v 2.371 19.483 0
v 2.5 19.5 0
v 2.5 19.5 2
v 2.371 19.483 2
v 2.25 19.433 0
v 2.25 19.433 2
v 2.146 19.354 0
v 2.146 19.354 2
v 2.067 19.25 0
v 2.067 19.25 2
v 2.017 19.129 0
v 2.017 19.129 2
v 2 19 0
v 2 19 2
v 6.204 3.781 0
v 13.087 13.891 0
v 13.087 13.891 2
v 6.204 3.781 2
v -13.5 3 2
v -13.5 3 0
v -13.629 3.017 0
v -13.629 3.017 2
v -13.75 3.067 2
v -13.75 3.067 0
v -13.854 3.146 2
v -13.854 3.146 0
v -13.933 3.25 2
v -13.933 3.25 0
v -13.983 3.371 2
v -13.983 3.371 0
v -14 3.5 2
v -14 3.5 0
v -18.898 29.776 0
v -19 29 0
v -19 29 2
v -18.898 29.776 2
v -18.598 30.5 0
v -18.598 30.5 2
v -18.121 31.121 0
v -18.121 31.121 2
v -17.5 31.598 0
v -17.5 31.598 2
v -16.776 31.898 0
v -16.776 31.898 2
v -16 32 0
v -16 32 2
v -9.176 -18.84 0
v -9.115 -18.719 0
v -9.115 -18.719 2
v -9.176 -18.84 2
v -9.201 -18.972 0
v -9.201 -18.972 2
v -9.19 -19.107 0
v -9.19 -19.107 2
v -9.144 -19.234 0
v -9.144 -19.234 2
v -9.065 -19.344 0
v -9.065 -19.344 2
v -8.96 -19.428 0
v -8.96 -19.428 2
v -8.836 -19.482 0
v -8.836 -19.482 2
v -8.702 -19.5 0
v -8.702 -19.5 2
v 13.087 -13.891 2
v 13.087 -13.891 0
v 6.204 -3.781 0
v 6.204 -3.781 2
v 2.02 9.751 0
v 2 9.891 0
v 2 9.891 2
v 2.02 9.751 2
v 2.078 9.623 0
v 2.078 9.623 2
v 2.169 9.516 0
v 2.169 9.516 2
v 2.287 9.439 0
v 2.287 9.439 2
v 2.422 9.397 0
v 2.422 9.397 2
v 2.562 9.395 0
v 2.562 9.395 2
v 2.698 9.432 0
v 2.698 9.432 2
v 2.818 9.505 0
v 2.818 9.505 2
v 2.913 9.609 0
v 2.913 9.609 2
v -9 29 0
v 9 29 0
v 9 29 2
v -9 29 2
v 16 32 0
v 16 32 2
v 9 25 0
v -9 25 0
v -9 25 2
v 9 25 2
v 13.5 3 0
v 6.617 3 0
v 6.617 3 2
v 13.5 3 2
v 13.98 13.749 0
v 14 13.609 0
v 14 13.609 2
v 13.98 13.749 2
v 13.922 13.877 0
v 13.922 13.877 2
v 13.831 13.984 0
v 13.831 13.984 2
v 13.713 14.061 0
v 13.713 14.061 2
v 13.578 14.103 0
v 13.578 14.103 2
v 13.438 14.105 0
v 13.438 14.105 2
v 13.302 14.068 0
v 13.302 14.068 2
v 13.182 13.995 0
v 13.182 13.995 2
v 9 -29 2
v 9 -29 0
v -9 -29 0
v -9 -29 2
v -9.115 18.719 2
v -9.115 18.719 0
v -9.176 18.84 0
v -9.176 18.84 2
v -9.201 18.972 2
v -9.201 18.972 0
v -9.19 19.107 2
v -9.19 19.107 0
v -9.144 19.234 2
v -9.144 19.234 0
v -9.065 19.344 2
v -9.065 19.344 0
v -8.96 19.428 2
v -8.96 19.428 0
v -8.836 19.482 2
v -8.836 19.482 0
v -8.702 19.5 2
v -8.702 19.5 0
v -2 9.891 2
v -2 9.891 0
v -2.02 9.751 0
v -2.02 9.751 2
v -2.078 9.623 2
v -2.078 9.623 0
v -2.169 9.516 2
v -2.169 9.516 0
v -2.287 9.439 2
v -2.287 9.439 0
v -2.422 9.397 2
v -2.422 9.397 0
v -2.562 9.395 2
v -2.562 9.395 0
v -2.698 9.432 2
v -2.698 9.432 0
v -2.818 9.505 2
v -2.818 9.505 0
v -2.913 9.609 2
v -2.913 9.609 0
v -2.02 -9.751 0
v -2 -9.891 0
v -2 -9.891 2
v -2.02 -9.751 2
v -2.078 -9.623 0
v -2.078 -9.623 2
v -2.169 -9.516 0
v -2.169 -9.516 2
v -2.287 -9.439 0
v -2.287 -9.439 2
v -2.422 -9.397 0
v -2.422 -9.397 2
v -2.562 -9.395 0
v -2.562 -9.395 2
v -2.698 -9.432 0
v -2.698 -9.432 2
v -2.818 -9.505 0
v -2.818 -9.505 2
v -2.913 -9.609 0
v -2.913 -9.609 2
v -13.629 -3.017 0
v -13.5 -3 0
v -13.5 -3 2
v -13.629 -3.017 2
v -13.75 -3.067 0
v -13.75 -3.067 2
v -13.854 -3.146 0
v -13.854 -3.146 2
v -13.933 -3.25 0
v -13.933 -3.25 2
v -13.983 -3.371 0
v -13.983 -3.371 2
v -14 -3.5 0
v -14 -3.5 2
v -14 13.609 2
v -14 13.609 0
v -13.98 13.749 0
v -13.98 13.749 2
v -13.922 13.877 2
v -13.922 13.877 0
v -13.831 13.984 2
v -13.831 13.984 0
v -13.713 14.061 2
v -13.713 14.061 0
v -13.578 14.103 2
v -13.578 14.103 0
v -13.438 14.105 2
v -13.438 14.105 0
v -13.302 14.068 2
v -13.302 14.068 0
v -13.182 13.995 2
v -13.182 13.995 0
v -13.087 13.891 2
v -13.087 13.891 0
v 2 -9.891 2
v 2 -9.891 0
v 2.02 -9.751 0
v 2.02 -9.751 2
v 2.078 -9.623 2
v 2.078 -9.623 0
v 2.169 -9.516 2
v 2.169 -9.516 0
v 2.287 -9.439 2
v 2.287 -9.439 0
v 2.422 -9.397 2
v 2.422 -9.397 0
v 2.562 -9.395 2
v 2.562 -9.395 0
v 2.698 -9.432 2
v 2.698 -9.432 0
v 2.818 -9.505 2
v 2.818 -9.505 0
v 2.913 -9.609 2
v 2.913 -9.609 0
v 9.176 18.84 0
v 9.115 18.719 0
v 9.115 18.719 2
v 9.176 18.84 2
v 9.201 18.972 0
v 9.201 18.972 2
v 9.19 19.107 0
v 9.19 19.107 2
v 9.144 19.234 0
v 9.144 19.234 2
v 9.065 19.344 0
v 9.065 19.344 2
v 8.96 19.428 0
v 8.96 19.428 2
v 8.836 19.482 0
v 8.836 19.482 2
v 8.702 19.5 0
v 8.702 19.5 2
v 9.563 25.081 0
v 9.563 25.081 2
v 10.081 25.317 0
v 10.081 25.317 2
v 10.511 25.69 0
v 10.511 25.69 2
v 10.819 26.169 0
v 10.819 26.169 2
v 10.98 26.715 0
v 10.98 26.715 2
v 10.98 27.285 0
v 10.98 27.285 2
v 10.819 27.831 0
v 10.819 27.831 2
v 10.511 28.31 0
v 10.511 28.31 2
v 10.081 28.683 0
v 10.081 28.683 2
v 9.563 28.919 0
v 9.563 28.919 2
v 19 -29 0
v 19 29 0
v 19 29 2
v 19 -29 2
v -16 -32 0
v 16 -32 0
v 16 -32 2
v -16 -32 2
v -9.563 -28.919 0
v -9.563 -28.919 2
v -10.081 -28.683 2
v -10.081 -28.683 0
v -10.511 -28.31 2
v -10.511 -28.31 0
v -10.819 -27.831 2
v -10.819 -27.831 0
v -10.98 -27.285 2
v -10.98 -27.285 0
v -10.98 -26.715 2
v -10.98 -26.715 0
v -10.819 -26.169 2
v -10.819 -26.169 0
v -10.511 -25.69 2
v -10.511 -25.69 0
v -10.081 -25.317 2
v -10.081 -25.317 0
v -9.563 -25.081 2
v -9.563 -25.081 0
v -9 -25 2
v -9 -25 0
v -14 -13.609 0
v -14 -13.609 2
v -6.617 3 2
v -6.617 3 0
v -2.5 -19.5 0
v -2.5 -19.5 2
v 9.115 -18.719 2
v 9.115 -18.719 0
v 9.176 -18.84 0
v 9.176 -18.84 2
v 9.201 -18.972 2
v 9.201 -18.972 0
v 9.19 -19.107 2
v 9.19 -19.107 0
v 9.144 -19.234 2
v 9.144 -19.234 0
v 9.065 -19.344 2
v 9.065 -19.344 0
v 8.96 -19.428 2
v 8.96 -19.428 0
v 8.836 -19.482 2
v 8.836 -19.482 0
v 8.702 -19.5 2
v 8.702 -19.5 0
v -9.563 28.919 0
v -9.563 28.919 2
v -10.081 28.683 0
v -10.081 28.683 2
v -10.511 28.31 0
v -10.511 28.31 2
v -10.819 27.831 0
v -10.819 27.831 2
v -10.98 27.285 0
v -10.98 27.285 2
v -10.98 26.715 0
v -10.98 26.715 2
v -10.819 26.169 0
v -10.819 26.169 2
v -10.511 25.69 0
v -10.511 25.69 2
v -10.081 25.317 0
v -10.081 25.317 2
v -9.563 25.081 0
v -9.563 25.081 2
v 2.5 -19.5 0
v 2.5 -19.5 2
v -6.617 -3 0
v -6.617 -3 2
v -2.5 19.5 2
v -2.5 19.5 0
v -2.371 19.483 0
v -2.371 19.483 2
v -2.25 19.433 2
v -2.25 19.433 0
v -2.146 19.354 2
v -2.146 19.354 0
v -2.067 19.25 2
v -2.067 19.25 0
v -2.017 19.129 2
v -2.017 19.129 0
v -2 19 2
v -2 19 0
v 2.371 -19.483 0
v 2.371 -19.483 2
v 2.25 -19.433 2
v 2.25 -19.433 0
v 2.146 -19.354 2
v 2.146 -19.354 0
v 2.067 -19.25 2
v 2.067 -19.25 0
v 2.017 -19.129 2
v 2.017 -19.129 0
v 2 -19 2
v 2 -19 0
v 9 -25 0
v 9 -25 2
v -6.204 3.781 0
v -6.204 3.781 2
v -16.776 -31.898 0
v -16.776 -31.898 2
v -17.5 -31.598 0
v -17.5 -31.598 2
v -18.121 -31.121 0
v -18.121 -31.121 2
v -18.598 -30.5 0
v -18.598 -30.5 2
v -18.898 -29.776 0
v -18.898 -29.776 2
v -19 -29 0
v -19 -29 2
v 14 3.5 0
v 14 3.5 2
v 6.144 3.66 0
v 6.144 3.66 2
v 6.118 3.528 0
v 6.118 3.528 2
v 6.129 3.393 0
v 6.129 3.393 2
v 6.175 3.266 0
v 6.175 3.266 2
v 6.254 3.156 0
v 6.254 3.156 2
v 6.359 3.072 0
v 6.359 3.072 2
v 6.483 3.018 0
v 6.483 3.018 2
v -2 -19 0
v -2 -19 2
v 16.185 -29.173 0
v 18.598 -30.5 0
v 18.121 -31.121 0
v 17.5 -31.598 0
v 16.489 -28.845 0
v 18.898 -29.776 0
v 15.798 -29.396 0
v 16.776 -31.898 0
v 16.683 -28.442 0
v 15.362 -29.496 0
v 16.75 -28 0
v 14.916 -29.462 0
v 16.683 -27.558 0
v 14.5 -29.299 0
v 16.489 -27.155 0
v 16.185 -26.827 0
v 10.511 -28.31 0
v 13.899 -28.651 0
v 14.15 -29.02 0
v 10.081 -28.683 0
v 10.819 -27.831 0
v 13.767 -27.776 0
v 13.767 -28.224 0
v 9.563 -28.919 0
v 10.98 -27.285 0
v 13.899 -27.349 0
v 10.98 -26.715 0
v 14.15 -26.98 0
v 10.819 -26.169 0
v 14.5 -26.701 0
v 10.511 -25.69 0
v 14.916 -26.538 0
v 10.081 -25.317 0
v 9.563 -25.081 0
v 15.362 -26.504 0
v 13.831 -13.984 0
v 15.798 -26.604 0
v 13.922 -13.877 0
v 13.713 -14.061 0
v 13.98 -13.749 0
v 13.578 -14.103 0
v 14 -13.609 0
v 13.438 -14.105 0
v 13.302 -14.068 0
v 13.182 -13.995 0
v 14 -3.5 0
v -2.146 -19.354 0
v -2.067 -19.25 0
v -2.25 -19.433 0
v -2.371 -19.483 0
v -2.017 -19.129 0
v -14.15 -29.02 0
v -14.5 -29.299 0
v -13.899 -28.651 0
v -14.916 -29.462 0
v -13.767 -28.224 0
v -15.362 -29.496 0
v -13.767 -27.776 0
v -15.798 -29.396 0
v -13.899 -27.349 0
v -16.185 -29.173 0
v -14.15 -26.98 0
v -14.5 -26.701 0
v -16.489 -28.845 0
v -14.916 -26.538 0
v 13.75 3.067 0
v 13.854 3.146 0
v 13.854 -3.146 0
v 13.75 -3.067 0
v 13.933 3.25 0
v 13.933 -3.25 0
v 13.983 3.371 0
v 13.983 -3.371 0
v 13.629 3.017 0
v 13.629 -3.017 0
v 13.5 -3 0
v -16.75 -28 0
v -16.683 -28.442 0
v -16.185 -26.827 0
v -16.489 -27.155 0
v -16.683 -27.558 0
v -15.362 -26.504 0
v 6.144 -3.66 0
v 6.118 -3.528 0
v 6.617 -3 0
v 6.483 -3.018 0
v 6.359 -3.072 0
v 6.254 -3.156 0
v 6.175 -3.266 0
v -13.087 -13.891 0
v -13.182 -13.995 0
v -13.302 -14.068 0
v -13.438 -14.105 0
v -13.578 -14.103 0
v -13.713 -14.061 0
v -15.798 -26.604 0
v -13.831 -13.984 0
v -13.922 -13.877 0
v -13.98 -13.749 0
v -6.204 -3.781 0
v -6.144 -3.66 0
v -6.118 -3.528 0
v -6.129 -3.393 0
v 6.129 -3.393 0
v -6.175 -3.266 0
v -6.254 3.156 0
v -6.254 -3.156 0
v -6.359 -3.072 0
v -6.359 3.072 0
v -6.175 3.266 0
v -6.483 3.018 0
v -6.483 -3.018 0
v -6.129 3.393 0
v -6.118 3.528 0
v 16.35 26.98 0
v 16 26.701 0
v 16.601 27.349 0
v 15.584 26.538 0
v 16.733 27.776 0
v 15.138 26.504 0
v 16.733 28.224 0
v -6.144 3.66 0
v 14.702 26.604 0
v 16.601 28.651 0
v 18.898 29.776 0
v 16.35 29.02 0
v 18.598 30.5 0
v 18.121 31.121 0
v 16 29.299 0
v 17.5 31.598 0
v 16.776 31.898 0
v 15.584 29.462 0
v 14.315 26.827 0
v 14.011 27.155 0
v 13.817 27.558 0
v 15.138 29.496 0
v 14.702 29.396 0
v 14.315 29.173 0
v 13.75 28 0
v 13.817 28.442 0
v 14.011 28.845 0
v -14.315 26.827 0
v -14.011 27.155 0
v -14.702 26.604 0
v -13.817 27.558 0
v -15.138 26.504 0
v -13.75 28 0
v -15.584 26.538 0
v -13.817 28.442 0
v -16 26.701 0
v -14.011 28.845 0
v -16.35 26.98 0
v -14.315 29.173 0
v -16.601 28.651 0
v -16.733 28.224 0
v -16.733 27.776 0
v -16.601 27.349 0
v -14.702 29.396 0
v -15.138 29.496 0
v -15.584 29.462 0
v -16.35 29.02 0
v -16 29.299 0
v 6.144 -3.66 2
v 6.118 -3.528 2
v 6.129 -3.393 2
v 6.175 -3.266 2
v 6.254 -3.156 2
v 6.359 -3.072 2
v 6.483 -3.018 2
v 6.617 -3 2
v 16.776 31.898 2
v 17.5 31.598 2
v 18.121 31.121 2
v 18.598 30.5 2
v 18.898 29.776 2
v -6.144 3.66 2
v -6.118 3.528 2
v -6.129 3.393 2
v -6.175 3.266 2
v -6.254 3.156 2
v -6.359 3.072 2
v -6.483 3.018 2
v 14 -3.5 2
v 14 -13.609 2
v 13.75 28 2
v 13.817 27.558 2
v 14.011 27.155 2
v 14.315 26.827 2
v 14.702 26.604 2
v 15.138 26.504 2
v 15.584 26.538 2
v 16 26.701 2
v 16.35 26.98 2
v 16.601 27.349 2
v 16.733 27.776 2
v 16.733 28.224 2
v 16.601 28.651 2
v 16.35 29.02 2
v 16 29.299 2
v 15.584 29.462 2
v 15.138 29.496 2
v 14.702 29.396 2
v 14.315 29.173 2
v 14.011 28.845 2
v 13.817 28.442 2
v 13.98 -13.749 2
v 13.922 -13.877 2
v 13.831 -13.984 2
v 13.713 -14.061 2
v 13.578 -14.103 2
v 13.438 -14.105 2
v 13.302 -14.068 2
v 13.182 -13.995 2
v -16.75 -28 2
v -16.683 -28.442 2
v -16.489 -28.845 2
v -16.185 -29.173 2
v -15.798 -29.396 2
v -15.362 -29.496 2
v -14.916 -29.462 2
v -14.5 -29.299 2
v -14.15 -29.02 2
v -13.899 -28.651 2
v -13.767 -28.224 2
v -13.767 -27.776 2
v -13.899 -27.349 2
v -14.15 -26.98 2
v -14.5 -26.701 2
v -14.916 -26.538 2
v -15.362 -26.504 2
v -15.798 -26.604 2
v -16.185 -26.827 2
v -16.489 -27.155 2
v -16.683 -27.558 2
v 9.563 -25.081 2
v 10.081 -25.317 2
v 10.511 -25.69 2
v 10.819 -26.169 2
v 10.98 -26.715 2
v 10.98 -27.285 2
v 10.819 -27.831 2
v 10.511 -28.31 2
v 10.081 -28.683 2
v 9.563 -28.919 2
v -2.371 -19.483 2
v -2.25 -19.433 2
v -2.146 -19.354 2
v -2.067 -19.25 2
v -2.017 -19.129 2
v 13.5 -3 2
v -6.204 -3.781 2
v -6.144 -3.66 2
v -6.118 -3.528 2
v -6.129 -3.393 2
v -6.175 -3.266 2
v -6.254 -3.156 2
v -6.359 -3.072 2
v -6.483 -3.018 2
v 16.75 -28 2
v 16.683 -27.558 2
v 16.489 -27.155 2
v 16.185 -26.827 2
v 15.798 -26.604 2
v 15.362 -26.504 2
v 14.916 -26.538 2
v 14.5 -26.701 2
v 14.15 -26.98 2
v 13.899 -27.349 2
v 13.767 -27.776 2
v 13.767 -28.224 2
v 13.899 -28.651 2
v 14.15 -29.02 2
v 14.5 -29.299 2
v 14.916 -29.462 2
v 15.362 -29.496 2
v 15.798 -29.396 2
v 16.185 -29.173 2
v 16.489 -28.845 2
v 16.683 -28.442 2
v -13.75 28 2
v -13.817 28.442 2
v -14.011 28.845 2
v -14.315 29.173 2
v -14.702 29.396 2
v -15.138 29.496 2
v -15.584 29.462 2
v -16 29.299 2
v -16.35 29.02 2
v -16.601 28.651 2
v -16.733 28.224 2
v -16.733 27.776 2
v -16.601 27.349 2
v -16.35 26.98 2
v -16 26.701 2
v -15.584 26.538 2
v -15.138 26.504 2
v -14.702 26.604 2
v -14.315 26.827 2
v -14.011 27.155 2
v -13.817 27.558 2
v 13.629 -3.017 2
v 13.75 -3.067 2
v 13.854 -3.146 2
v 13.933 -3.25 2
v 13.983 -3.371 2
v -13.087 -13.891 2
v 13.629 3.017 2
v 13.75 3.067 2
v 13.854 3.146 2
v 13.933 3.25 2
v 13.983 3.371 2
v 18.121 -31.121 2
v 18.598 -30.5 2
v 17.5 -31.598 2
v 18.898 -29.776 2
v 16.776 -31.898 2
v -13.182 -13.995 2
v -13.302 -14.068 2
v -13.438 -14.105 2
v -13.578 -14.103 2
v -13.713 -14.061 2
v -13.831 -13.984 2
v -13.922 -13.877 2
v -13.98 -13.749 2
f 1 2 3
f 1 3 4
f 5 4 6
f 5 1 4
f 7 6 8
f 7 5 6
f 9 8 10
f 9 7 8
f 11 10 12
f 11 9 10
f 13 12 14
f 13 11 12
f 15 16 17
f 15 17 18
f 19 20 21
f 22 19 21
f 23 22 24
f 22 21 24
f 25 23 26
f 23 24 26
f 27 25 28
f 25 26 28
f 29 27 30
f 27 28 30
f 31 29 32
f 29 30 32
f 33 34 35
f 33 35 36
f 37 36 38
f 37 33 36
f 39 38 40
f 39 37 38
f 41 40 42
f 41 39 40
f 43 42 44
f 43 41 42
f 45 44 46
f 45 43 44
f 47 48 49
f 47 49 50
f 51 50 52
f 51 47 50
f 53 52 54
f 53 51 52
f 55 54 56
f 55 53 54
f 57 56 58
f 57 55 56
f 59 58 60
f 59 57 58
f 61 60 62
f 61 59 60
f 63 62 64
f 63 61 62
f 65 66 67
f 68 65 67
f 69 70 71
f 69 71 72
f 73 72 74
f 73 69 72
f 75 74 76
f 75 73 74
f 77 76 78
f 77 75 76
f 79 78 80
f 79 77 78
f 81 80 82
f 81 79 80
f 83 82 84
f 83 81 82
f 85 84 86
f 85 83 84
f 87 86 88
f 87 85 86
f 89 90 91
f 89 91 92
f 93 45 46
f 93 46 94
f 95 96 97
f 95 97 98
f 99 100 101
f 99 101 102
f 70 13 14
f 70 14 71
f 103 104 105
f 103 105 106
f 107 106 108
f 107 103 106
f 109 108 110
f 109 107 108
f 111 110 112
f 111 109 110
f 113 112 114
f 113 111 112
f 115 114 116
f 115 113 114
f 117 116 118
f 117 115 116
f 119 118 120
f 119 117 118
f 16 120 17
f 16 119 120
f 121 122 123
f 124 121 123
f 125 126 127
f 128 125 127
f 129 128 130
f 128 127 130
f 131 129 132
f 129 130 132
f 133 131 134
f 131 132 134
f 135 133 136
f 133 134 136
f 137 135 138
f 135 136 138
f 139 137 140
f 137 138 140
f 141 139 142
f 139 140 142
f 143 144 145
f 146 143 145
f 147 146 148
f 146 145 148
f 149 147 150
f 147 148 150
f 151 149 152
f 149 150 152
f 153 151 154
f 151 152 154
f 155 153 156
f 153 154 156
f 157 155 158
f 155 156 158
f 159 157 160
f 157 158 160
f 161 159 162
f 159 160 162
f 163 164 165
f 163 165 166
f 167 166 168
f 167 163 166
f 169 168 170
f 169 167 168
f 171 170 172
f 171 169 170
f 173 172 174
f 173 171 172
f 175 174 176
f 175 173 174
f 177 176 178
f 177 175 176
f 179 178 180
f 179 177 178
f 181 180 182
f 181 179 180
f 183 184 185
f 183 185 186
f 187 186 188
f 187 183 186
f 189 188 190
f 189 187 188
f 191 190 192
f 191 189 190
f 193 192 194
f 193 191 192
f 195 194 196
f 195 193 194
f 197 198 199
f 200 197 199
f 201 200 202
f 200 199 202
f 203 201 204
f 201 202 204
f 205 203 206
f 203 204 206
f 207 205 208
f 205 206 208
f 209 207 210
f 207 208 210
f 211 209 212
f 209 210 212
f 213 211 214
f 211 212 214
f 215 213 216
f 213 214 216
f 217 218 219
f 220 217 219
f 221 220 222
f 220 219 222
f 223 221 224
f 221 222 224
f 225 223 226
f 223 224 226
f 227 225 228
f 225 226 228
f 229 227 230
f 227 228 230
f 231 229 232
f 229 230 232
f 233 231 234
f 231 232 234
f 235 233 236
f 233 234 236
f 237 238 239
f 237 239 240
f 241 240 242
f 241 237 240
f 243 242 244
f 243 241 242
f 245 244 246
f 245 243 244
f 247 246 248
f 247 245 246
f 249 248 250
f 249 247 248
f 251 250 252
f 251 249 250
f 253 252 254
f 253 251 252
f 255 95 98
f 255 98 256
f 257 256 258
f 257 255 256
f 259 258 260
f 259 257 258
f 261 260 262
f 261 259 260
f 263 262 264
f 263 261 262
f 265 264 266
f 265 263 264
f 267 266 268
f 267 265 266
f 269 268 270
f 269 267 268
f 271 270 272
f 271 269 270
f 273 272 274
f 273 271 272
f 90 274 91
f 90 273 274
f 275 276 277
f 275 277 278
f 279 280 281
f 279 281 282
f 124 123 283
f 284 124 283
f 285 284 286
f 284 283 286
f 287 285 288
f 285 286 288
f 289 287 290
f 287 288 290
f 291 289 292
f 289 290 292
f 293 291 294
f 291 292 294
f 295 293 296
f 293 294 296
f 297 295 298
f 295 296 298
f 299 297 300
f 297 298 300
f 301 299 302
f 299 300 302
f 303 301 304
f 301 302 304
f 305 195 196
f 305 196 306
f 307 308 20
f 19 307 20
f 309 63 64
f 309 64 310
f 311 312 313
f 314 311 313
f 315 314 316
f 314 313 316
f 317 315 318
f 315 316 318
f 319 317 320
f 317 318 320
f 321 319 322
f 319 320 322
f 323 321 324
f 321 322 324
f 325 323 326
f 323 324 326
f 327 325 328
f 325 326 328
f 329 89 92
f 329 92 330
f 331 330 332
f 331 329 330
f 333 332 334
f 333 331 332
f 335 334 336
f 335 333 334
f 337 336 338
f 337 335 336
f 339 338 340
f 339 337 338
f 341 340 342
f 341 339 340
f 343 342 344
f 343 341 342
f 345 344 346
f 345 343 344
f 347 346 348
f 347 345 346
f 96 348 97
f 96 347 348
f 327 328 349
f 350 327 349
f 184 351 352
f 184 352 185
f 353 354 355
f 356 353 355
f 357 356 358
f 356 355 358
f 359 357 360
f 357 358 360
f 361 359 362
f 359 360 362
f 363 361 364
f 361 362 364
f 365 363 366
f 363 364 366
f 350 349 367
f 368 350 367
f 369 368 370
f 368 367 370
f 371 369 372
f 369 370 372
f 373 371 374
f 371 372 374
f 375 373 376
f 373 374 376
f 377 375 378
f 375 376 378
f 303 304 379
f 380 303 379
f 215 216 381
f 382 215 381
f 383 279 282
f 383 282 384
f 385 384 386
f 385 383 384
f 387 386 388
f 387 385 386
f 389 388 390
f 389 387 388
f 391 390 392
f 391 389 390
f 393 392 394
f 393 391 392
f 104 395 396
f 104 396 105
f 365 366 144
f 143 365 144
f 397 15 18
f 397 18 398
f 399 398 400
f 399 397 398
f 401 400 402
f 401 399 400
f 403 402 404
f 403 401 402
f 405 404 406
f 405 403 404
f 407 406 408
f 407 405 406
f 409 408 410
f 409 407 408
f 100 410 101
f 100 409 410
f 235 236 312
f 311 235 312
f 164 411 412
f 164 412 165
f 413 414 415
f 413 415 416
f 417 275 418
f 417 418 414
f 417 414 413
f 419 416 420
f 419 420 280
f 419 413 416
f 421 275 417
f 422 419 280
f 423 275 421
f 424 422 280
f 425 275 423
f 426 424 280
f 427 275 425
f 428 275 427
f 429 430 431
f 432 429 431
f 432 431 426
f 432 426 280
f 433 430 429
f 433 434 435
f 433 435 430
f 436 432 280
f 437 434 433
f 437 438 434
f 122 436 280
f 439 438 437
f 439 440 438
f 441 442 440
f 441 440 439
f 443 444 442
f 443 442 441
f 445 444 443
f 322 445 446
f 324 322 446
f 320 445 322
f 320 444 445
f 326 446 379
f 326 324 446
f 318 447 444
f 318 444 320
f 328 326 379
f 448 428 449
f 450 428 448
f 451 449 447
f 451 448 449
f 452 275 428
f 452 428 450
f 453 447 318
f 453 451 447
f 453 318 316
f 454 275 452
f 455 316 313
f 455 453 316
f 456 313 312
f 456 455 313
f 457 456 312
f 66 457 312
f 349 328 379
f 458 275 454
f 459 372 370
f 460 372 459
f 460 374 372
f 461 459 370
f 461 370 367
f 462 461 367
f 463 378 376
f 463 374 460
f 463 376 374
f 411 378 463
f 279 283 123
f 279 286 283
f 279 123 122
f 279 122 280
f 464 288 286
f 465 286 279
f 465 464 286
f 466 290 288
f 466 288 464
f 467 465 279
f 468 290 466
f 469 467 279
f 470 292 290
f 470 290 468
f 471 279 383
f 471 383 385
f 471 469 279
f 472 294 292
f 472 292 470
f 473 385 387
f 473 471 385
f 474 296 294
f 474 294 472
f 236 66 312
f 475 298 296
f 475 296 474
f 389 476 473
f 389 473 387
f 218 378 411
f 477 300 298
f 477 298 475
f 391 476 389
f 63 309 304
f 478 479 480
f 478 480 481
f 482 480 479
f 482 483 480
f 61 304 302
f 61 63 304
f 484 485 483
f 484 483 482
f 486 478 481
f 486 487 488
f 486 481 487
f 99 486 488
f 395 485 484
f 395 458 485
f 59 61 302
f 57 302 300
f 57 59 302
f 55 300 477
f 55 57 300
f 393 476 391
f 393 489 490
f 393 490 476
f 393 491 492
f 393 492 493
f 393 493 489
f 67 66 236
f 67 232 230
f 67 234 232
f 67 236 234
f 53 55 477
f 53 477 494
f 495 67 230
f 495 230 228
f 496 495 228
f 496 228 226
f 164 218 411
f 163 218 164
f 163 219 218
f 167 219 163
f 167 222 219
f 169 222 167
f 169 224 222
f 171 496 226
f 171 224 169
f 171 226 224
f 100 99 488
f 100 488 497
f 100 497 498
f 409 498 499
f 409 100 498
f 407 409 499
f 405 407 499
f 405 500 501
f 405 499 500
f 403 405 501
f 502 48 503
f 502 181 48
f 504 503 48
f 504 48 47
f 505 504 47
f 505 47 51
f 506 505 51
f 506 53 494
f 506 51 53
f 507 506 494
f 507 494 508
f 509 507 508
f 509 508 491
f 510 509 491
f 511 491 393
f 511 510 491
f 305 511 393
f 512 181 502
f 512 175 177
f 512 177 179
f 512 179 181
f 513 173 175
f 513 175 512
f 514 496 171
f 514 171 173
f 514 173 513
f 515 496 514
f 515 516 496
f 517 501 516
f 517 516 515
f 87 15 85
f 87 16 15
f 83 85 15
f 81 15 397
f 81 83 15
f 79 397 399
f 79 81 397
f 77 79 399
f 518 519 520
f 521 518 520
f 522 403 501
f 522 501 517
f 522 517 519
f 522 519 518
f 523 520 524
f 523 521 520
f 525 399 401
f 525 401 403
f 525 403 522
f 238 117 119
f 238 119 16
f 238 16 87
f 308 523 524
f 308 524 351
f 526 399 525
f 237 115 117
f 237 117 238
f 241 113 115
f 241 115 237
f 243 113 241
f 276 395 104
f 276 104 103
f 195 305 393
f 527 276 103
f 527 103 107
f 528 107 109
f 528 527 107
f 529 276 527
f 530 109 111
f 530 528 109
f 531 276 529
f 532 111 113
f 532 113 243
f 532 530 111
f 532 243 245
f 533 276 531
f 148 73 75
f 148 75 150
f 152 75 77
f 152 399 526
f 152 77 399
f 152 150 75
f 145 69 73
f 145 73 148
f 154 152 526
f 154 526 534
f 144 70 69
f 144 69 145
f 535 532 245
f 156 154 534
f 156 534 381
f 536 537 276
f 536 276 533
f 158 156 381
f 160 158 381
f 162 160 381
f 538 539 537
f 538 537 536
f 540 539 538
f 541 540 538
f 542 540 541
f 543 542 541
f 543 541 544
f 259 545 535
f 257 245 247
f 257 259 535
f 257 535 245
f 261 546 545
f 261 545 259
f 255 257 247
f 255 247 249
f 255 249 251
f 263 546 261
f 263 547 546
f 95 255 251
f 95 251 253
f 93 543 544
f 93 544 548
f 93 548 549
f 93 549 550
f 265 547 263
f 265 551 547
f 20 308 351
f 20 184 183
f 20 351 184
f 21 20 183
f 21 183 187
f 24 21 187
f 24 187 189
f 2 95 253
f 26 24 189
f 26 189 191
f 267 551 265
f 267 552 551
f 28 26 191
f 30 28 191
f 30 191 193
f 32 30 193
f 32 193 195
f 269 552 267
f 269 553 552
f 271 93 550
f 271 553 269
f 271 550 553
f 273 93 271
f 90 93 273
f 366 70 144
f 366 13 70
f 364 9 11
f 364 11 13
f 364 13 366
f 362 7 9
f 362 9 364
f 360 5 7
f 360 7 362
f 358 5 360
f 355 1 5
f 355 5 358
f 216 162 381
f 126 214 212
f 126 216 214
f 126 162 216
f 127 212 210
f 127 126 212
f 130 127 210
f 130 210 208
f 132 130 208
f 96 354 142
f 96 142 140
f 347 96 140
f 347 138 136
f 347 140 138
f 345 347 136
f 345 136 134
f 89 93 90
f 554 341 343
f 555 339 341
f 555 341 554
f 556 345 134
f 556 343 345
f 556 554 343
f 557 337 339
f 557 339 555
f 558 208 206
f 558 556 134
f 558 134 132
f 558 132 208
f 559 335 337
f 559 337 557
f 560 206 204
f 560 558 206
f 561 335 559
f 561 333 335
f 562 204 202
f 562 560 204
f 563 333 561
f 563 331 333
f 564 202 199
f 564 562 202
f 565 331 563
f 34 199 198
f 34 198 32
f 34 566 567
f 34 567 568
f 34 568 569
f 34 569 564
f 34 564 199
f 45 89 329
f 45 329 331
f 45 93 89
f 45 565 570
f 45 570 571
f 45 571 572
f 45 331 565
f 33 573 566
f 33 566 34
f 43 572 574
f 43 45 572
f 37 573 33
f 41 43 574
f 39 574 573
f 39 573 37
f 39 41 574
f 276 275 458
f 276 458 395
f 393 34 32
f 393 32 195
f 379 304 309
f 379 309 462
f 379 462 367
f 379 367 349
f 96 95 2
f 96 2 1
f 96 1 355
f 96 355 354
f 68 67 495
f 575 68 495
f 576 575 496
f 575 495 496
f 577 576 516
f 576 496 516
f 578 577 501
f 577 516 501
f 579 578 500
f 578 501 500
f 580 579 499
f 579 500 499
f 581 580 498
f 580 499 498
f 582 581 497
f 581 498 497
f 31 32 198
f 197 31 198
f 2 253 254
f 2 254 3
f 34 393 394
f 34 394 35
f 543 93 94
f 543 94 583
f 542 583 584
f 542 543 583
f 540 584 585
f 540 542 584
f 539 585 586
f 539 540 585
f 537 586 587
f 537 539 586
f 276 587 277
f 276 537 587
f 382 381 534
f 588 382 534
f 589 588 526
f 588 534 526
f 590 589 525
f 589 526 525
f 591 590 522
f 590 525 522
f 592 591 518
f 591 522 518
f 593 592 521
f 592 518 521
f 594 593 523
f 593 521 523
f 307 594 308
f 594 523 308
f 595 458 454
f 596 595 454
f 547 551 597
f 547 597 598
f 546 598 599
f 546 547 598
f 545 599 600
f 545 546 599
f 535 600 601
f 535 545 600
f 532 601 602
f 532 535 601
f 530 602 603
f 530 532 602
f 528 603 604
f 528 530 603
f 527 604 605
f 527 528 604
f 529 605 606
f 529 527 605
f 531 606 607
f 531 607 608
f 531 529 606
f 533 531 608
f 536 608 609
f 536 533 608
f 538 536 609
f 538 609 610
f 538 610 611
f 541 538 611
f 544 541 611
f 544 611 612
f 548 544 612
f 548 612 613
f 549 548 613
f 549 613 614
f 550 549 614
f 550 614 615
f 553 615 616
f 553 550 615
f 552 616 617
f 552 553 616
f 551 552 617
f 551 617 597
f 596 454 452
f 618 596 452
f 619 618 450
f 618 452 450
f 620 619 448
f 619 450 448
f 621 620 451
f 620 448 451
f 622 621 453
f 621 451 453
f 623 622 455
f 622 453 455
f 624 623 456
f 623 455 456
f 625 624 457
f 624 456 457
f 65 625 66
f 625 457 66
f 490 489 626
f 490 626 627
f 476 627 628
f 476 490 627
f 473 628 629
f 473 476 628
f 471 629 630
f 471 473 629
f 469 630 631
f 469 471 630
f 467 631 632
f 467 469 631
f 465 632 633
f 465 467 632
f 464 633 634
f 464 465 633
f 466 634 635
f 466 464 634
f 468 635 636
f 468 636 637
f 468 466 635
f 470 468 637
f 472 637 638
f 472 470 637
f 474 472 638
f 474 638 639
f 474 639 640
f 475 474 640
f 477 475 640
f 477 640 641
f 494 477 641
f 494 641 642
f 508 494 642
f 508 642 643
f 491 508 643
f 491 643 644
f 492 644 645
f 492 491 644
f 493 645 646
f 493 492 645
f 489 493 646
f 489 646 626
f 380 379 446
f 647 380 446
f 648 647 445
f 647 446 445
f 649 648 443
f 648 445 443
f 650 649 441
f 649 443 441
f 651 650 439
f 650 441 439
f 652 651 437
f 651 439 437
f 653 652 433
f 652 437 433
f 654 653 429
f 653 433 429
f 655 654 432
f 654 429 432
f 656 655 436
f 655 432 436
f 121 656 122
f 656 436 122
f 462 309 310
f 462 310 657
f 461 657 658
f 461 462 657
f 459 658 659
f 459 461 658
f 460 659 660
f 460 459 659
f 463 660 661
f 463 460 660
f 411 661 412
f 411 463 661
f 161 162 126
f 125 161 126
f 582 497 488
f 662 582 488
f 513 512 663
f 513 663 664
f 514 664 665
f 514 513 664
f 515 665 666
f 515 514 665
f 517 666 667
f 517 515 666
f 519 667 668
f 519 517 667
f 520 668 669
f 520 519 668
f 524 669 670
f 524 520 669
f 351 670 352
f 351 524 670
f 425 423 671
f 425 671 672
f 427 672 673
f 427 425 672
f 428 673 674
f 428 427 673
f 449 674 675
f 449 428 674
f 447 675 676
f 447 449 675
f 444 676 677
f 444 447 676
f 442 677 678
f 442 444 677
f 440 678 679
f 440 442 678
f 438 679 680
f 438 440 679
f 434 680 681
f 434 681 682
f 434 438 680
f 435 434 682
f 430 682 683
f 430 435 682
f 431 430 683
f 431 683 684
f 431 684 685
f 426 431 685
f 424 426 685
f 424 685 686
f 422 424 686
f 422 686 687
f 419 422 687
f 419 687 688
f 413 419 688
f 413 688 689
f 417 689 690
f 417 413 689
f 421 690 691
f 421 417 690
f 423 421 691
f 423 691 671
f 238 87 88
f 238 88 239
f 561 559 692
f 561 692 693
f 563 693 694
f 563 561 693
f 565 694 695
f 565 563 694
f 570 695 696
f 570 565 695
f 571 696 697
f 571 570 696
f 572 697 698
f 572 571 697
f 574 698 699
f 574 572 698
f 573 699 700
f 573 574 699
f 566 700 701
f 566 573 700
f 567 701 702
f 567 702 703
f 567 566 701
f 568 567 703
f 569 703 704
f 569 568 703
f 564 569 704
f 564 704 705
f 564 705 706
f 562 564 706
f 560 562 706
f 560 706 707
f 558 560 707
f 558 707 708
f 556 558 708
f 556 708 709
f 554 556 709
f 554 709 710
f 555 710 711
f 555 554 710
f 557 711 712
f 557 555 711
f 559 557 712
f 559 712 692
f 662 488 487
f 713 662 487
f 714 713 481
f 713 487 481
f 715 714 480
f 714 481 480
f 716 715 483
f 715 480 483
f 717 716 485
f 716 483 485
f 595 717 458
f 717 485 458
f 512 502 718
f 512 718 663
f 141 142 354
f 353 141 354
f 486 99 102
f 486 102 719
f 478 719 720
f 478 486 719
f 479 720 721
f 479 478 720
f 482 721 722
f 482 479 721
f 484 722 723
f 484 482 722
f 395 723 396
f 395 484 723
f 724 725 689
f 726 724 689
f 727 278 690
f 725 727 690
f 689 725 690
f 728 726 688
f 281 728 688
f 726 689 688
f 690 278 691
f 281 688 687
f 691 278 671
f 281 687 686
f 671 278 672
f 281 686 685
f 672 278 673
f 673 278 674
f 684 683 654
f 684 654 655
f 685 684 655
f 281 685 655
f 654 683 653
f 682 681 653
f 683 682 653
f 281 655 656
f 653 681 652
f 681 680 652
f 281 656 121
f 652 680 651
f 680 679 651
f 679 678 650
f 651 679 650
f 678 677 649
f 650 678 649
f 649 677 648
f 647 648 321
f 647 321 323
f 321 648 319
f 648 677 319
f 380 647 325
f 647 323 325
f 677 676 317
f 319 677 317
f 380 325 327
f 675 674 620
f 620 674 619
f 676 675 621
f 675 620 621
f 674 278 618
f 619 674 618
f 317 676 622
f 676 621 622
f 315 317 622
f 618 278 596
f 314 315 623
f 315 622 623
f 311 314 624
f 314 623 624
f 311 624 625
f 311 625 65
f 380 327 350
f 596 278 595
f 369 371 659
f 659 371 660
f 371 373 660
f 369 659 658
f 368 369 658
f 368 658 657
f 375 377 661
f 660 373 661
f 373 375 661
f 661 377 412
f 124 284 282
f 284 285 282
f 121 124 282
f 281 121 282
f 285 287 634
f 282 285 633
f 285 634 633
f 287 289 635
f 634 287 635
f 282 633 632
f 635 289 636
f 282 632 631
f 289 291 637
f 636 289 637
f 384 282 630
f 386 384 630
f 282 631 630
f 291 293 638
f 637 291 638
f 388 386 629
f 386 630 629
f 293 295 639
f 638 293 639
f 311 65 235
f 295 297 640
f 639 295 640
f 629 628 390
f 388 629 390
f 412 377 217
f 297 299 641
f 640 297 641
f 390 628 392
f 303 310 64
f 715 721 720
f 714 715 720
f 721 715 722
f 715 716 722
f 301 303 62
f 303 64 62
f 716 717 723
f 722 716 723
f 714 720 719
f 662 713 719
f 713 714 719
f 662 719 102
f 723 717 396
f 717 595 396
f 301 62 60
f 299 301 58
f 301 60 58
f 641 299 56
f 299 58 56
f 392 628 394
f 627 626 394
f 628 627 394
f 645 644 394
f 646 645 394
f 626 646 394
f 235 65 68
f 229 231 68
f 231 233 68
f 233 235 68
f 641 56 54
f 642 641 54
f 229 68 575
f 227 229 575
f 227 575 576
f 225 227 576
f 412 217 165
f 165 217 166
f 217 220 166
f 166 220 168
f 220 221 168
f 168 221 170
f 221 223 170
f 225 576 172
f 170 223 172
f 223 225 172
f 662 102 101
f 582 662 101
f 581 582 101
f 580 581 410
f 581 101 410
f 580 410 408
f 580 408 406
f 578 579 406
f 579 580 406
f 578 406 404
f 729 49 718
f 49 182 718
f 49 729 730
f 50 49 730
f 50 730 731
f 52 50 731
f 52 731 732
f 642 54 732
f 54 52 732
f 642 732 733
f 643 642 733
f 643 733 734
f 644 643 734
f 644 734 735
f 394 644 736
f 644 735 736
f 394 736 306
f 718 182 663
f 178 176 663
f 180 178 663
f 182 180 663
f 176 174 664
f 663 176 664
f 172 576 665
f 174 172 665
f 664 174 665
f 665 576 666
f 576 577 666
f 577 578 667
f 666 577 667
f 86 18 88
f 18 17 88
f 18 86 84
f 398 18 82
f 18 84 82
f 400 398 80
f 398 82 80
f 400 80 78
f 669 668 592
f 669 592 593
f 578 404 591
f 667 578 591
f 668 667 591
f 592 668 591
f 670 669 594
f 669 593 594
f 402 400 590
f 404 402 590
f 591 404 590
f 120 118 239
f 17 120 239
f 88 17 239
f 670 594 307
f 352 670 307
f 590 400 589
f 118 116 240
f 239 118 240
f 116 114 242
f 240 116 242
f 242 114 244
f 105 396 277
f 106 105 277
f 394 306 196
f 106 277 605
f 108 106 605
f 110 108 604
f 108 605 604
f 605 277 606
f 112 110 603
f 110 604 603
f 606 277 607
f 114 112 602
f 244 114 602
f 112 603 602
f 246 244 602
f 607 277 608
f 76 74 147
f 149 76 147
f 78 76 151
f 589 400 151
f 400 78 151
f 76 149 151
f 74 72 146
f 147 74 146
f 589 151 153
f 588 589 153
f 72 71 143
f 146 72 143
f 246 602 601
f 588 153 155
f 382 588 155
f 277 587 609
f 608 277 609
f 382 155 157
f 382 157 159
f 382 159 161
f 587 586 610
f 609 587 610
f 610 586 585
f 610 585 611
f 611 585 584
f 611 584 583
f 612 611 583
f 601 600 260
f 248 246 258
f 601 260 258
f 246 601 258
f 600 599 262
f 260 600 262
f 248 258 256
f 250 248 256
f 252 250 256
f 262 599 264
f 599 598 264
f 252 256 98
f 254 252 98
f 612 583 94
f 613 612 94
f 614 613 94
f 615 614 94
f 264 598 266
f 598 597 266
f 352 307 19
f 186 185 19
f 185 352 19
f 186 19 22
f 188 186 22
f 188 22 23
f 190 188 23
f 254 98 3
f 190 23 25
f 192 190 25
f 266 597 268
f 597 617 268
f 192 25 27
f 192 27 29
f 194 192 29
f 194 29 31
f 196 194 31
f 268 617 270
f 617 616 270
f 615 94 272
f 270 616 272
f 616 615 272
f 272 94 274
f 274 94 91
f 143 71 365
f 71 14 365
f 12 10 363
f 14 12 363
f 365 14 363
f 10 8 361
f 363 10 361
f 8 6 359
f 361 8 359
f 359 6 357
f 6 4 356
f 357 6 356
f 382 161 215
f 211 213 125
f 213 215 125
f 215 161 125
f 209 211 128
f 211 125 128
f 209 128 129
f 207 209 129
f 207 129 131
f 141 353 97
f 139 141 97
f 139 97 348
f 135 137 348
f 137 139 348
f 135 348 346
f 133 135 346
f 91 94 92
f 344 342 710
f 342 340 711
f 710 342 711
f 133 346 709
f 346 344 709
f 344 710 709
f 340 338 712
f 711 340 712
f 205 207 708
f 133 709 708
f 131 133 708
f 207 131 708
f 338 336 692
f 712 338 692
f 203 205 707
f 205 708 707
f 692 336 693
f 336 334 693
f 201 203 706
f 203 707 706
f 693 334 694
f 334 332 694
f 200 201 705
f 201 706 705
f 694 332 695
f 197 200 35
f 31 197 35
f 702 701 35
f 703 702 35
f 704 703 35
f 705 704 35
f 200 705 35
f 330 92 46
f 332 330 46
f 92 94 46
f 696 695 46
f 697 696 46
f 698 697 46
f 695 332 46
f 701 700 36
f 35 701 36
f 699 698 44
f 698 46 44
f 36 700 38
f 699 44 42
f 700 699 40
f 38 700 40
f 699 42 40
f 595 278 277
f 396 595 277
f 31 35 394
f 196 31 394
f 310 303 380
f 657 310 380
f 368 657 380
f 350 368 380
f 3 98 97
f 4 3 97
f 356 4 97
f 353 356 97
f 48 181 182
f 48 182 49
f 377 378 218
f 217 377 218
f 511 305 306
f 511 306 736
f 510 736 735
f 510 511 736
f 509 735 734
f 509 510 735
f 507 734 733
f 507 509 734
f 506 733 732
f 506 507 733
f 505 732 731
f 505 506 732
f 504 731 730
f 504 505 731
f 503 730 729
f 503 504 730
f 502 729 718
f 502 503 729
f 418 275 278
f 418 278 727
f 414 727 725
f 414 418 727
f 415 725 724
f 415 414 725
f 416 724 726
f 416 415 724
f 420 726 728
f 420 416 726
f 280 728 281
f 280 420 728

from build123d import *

# Parameters (mm, degrees)
SKETCH_1_R      = 1.5
EXTRUDE_1_DEPTH = 2


with BuildPart() as part:
    # 草图1 → 凸台-拉伸1 (new body)
    with BuildSketch(Plane.XY):
        with BuildLine():
            Line((-16, 32), (16, 32))
            ThreePointArc((16, 32), (18.121320344, 31.121320344), (19, 29))
            Line((19, 29), (19, -29))
            ThreePointArc((19, -29), (18.121320344, -31.121320344), (16, -32))
            Line((16, -32), (-16, -32))
            ThreePointArc((-16, -32), (-18.121320344, -31.121320344), (-19, -29))
            Line((-19, -29), (-19, 29))
            ThreePointArc((-19, 29), (-18.121320344, 31.121320344), (-16, 32))
        make_face()
        with Locations((-15.25, 28)):
            Circle(SKETCH_1_R, mode=Mode.SUBTRACT)
        with Locations(Location((15.25, 28, 0), (0, 0, 180))):
            Circle(SKETCH_1_R, mode=Mode.SUBTRACT)
        with Locations((15.25, -28)):
            Circle(SKETCH_1_R, mode=Mode.SUBTRACT)
        with Locations(Location((-15.25, -28, 0), (0, 0, 180))):
            Circle(SKETCH_1_R, mode=Mode.SUBTRACT)
        with BuildLine():
            Line((-9, -25), (9, -25))
            ThreePointArc((9, -25), (11, -27), (9, -29))
            Line((9, -29), (-9, -29))
            ThreePointArc((-9, -29), (-11, -27), (-9, -25))
        make_face(mode=Mode.SUBTRACT)
        with BuildLine():
            Line((-9, 25), (9, 25))
            ThreePointArc((9, 25), (11, 27), (9, 29))
            Line((9, 29), (-9, 29))
            ThreePointArc((-9, 29), (-11, 27), (-9, 25))
        make_face(mode=Mode.SUBTRACT)
        with BuildLine():
            Line((-6.617195014, 3), (-13.5, 3))
            ThreePointArc((-13.5, 3), (-13.853553391, 3.146446609), (-14, 3.5))
            Line((-14, 3.5), (-14, 13.609119823))
            ThreePointArc((-14, 13.609119823), (-13.647224638, 14.086953378), (-13.086700376, 13.890515312))
            Line((-13.086700376, 13.890515312), (-6.20389539, 3.781395489))
            ThreePointArc((-6.20389539, 3.781395489), (-6.175212127, 3.266224193), (-6.617195014, 3))
        make_face(mode=Mode.SUBTRACT)
        with BuildLine():
            Line((14, 3.5), (14, 13.609119823))
            ThreePointArc((14, 13.609119823), (13.647224638, 14.086953378), (13.086700376, 13.890515312))
            Line((13.086700376, 13.890515312), (6.20389539, 3.781395489))
            ThreePointArc((6.20389539, 3.781395489), (6.175212127, 3.266224193), (6.617195014, 3))
            Line((6.617195014, 3), (13.5, 3))
            ThreePointArc((13.5, 3), (13.853553391, 3.146446609), (14, 3.5))
        make_face(mode=Mode.SUBTRACT)
        with BuildLine():
            Line((6.617195014, -3), (13.5, -3))
            ThreePointArc((13.5, -3), (13.853553391, -3.146446609), (14, -3.5))
            Line((14, -3.5), (14, -13.609119823))
            ThreePointArc((14, -13.609119823), (13.647224638, -14.086953378), (13.086700376, -13.890515312))
            Line((13.086700376, -13.890515312), (6.20389539, -3.781395489))
            ThreePointArc((6.20389539, -3.781395489), (6.175212127, -3.266224193), (6.617195014, -3))
        make_face(mode=Mode.SUBTRACT)
        with BuildLine():
            Line((-14, -3.5), (-14, -13.609119823))
            ThreePointArc((-14, -13.609119823), (-13.647224638, -14.086953378), (-13.086700376, -13.890515312))
            Line((-13.086700376, -13.890515312), (-6.20389539, -3.781395489))
            ThreePointArc((-6.20389539, -3.781395489), (-6.175212127, -3.266224193), (-6.617195014, -3))
            Line((-6.617195014, -3), (-13.5, -3))
            ThreePointArc((-13.5, -3), (-13.853553391, -3.146446609), (-14, -3.5))
        make_face(mode=Mode.SUBTRACT)
        with BuildLine():
            Line((-8.701953922, 19.5), (-2.5, 19.5))
            ThreePointArc((-2.5, 19.5), (-2.146446609, 19.353553391), (-2, 19))
            Line((-2, 19), (-2, 9.890880177))
            ThreePointArc((-2, 9.890880177), (-2.352775362, 9.413046622), (-2.913299624, 9.609484688))
            Line((-2.913299624, 9.609484688), (-9.115253546, 18.718604511))
            ThreePointArc((-9.115253546, 18.718604511), (-9.143936809, 19.233775807), (-8.701953922, 19.5))
        make_face(mode=Mode.SUBTRACT)
        with BuildLine():
            Line((2, 19), (2, 9.890880177))
            ThreePointArc((2, 9.890880177), (2.352775362, 9.413046622), (2.913299624, 9.609484688))
            Line((2.913299624, 9.609484688), (9.115253546, 18.718604511))
            ThreePointArc((9.115253546, 18.718604511), (9.143936809, 19.233775807), (8.701953922, 19.5))
            Line((8.701953922, 19.5), (2.5, 19.5))
            ThreePointArc((2.5, 19.5), (2.146446609, 19.353553391), (2, 19))
        make_face(mode=Mode.SUBTRACT)
        with BuildLine():
            Line((8.701953922, -19.5), (2.5, -19.5))
            ThreePointArc((2.5, -19.5), (2.146446609, -19.353553391), (2, -19))
            Line((2, -19), (2, -9.890880177))
            ThreePointArc((2, -9.890880177), (2.352775362, -9.413046622), (2.913299624, -9.609484688))
            Line((2.913299624, -9.609484688), (9.115253546, -18.718604511))
            ThreePointArc((9.115253546, -18.718604511), (9.143936809, -19.233775807), (8.701953922, -19.5))
        make_face(mode=Mode.SUBTRACT)
        with BuildLine():
            Line((-2, -19), (-2, -9.890880177))
            ThreePointArc((-2, -9.890880177), (-2.352775362, -9.413046622), (-2.913299624, -9.609484688))
            Line((-2.913299624, -9.609484688), (-9.115253546, -18.718604511))
            ThreePointArc((-9.115253546, -18.718604511), (-9.143936809, -19.233775807), (-8.701953922, -19.5))
            Line((-8.701953922, -19.5), (-2.5, -19.5))
            ThreePointArc((-2.5, -19.5), (-2.146446609, -19.353553391), (-2, -19))
        make_face(mode=Mode.SUBTRACT)
    extrude(amount=EXTRUDE_1_DEPTH)


solid = part.part
